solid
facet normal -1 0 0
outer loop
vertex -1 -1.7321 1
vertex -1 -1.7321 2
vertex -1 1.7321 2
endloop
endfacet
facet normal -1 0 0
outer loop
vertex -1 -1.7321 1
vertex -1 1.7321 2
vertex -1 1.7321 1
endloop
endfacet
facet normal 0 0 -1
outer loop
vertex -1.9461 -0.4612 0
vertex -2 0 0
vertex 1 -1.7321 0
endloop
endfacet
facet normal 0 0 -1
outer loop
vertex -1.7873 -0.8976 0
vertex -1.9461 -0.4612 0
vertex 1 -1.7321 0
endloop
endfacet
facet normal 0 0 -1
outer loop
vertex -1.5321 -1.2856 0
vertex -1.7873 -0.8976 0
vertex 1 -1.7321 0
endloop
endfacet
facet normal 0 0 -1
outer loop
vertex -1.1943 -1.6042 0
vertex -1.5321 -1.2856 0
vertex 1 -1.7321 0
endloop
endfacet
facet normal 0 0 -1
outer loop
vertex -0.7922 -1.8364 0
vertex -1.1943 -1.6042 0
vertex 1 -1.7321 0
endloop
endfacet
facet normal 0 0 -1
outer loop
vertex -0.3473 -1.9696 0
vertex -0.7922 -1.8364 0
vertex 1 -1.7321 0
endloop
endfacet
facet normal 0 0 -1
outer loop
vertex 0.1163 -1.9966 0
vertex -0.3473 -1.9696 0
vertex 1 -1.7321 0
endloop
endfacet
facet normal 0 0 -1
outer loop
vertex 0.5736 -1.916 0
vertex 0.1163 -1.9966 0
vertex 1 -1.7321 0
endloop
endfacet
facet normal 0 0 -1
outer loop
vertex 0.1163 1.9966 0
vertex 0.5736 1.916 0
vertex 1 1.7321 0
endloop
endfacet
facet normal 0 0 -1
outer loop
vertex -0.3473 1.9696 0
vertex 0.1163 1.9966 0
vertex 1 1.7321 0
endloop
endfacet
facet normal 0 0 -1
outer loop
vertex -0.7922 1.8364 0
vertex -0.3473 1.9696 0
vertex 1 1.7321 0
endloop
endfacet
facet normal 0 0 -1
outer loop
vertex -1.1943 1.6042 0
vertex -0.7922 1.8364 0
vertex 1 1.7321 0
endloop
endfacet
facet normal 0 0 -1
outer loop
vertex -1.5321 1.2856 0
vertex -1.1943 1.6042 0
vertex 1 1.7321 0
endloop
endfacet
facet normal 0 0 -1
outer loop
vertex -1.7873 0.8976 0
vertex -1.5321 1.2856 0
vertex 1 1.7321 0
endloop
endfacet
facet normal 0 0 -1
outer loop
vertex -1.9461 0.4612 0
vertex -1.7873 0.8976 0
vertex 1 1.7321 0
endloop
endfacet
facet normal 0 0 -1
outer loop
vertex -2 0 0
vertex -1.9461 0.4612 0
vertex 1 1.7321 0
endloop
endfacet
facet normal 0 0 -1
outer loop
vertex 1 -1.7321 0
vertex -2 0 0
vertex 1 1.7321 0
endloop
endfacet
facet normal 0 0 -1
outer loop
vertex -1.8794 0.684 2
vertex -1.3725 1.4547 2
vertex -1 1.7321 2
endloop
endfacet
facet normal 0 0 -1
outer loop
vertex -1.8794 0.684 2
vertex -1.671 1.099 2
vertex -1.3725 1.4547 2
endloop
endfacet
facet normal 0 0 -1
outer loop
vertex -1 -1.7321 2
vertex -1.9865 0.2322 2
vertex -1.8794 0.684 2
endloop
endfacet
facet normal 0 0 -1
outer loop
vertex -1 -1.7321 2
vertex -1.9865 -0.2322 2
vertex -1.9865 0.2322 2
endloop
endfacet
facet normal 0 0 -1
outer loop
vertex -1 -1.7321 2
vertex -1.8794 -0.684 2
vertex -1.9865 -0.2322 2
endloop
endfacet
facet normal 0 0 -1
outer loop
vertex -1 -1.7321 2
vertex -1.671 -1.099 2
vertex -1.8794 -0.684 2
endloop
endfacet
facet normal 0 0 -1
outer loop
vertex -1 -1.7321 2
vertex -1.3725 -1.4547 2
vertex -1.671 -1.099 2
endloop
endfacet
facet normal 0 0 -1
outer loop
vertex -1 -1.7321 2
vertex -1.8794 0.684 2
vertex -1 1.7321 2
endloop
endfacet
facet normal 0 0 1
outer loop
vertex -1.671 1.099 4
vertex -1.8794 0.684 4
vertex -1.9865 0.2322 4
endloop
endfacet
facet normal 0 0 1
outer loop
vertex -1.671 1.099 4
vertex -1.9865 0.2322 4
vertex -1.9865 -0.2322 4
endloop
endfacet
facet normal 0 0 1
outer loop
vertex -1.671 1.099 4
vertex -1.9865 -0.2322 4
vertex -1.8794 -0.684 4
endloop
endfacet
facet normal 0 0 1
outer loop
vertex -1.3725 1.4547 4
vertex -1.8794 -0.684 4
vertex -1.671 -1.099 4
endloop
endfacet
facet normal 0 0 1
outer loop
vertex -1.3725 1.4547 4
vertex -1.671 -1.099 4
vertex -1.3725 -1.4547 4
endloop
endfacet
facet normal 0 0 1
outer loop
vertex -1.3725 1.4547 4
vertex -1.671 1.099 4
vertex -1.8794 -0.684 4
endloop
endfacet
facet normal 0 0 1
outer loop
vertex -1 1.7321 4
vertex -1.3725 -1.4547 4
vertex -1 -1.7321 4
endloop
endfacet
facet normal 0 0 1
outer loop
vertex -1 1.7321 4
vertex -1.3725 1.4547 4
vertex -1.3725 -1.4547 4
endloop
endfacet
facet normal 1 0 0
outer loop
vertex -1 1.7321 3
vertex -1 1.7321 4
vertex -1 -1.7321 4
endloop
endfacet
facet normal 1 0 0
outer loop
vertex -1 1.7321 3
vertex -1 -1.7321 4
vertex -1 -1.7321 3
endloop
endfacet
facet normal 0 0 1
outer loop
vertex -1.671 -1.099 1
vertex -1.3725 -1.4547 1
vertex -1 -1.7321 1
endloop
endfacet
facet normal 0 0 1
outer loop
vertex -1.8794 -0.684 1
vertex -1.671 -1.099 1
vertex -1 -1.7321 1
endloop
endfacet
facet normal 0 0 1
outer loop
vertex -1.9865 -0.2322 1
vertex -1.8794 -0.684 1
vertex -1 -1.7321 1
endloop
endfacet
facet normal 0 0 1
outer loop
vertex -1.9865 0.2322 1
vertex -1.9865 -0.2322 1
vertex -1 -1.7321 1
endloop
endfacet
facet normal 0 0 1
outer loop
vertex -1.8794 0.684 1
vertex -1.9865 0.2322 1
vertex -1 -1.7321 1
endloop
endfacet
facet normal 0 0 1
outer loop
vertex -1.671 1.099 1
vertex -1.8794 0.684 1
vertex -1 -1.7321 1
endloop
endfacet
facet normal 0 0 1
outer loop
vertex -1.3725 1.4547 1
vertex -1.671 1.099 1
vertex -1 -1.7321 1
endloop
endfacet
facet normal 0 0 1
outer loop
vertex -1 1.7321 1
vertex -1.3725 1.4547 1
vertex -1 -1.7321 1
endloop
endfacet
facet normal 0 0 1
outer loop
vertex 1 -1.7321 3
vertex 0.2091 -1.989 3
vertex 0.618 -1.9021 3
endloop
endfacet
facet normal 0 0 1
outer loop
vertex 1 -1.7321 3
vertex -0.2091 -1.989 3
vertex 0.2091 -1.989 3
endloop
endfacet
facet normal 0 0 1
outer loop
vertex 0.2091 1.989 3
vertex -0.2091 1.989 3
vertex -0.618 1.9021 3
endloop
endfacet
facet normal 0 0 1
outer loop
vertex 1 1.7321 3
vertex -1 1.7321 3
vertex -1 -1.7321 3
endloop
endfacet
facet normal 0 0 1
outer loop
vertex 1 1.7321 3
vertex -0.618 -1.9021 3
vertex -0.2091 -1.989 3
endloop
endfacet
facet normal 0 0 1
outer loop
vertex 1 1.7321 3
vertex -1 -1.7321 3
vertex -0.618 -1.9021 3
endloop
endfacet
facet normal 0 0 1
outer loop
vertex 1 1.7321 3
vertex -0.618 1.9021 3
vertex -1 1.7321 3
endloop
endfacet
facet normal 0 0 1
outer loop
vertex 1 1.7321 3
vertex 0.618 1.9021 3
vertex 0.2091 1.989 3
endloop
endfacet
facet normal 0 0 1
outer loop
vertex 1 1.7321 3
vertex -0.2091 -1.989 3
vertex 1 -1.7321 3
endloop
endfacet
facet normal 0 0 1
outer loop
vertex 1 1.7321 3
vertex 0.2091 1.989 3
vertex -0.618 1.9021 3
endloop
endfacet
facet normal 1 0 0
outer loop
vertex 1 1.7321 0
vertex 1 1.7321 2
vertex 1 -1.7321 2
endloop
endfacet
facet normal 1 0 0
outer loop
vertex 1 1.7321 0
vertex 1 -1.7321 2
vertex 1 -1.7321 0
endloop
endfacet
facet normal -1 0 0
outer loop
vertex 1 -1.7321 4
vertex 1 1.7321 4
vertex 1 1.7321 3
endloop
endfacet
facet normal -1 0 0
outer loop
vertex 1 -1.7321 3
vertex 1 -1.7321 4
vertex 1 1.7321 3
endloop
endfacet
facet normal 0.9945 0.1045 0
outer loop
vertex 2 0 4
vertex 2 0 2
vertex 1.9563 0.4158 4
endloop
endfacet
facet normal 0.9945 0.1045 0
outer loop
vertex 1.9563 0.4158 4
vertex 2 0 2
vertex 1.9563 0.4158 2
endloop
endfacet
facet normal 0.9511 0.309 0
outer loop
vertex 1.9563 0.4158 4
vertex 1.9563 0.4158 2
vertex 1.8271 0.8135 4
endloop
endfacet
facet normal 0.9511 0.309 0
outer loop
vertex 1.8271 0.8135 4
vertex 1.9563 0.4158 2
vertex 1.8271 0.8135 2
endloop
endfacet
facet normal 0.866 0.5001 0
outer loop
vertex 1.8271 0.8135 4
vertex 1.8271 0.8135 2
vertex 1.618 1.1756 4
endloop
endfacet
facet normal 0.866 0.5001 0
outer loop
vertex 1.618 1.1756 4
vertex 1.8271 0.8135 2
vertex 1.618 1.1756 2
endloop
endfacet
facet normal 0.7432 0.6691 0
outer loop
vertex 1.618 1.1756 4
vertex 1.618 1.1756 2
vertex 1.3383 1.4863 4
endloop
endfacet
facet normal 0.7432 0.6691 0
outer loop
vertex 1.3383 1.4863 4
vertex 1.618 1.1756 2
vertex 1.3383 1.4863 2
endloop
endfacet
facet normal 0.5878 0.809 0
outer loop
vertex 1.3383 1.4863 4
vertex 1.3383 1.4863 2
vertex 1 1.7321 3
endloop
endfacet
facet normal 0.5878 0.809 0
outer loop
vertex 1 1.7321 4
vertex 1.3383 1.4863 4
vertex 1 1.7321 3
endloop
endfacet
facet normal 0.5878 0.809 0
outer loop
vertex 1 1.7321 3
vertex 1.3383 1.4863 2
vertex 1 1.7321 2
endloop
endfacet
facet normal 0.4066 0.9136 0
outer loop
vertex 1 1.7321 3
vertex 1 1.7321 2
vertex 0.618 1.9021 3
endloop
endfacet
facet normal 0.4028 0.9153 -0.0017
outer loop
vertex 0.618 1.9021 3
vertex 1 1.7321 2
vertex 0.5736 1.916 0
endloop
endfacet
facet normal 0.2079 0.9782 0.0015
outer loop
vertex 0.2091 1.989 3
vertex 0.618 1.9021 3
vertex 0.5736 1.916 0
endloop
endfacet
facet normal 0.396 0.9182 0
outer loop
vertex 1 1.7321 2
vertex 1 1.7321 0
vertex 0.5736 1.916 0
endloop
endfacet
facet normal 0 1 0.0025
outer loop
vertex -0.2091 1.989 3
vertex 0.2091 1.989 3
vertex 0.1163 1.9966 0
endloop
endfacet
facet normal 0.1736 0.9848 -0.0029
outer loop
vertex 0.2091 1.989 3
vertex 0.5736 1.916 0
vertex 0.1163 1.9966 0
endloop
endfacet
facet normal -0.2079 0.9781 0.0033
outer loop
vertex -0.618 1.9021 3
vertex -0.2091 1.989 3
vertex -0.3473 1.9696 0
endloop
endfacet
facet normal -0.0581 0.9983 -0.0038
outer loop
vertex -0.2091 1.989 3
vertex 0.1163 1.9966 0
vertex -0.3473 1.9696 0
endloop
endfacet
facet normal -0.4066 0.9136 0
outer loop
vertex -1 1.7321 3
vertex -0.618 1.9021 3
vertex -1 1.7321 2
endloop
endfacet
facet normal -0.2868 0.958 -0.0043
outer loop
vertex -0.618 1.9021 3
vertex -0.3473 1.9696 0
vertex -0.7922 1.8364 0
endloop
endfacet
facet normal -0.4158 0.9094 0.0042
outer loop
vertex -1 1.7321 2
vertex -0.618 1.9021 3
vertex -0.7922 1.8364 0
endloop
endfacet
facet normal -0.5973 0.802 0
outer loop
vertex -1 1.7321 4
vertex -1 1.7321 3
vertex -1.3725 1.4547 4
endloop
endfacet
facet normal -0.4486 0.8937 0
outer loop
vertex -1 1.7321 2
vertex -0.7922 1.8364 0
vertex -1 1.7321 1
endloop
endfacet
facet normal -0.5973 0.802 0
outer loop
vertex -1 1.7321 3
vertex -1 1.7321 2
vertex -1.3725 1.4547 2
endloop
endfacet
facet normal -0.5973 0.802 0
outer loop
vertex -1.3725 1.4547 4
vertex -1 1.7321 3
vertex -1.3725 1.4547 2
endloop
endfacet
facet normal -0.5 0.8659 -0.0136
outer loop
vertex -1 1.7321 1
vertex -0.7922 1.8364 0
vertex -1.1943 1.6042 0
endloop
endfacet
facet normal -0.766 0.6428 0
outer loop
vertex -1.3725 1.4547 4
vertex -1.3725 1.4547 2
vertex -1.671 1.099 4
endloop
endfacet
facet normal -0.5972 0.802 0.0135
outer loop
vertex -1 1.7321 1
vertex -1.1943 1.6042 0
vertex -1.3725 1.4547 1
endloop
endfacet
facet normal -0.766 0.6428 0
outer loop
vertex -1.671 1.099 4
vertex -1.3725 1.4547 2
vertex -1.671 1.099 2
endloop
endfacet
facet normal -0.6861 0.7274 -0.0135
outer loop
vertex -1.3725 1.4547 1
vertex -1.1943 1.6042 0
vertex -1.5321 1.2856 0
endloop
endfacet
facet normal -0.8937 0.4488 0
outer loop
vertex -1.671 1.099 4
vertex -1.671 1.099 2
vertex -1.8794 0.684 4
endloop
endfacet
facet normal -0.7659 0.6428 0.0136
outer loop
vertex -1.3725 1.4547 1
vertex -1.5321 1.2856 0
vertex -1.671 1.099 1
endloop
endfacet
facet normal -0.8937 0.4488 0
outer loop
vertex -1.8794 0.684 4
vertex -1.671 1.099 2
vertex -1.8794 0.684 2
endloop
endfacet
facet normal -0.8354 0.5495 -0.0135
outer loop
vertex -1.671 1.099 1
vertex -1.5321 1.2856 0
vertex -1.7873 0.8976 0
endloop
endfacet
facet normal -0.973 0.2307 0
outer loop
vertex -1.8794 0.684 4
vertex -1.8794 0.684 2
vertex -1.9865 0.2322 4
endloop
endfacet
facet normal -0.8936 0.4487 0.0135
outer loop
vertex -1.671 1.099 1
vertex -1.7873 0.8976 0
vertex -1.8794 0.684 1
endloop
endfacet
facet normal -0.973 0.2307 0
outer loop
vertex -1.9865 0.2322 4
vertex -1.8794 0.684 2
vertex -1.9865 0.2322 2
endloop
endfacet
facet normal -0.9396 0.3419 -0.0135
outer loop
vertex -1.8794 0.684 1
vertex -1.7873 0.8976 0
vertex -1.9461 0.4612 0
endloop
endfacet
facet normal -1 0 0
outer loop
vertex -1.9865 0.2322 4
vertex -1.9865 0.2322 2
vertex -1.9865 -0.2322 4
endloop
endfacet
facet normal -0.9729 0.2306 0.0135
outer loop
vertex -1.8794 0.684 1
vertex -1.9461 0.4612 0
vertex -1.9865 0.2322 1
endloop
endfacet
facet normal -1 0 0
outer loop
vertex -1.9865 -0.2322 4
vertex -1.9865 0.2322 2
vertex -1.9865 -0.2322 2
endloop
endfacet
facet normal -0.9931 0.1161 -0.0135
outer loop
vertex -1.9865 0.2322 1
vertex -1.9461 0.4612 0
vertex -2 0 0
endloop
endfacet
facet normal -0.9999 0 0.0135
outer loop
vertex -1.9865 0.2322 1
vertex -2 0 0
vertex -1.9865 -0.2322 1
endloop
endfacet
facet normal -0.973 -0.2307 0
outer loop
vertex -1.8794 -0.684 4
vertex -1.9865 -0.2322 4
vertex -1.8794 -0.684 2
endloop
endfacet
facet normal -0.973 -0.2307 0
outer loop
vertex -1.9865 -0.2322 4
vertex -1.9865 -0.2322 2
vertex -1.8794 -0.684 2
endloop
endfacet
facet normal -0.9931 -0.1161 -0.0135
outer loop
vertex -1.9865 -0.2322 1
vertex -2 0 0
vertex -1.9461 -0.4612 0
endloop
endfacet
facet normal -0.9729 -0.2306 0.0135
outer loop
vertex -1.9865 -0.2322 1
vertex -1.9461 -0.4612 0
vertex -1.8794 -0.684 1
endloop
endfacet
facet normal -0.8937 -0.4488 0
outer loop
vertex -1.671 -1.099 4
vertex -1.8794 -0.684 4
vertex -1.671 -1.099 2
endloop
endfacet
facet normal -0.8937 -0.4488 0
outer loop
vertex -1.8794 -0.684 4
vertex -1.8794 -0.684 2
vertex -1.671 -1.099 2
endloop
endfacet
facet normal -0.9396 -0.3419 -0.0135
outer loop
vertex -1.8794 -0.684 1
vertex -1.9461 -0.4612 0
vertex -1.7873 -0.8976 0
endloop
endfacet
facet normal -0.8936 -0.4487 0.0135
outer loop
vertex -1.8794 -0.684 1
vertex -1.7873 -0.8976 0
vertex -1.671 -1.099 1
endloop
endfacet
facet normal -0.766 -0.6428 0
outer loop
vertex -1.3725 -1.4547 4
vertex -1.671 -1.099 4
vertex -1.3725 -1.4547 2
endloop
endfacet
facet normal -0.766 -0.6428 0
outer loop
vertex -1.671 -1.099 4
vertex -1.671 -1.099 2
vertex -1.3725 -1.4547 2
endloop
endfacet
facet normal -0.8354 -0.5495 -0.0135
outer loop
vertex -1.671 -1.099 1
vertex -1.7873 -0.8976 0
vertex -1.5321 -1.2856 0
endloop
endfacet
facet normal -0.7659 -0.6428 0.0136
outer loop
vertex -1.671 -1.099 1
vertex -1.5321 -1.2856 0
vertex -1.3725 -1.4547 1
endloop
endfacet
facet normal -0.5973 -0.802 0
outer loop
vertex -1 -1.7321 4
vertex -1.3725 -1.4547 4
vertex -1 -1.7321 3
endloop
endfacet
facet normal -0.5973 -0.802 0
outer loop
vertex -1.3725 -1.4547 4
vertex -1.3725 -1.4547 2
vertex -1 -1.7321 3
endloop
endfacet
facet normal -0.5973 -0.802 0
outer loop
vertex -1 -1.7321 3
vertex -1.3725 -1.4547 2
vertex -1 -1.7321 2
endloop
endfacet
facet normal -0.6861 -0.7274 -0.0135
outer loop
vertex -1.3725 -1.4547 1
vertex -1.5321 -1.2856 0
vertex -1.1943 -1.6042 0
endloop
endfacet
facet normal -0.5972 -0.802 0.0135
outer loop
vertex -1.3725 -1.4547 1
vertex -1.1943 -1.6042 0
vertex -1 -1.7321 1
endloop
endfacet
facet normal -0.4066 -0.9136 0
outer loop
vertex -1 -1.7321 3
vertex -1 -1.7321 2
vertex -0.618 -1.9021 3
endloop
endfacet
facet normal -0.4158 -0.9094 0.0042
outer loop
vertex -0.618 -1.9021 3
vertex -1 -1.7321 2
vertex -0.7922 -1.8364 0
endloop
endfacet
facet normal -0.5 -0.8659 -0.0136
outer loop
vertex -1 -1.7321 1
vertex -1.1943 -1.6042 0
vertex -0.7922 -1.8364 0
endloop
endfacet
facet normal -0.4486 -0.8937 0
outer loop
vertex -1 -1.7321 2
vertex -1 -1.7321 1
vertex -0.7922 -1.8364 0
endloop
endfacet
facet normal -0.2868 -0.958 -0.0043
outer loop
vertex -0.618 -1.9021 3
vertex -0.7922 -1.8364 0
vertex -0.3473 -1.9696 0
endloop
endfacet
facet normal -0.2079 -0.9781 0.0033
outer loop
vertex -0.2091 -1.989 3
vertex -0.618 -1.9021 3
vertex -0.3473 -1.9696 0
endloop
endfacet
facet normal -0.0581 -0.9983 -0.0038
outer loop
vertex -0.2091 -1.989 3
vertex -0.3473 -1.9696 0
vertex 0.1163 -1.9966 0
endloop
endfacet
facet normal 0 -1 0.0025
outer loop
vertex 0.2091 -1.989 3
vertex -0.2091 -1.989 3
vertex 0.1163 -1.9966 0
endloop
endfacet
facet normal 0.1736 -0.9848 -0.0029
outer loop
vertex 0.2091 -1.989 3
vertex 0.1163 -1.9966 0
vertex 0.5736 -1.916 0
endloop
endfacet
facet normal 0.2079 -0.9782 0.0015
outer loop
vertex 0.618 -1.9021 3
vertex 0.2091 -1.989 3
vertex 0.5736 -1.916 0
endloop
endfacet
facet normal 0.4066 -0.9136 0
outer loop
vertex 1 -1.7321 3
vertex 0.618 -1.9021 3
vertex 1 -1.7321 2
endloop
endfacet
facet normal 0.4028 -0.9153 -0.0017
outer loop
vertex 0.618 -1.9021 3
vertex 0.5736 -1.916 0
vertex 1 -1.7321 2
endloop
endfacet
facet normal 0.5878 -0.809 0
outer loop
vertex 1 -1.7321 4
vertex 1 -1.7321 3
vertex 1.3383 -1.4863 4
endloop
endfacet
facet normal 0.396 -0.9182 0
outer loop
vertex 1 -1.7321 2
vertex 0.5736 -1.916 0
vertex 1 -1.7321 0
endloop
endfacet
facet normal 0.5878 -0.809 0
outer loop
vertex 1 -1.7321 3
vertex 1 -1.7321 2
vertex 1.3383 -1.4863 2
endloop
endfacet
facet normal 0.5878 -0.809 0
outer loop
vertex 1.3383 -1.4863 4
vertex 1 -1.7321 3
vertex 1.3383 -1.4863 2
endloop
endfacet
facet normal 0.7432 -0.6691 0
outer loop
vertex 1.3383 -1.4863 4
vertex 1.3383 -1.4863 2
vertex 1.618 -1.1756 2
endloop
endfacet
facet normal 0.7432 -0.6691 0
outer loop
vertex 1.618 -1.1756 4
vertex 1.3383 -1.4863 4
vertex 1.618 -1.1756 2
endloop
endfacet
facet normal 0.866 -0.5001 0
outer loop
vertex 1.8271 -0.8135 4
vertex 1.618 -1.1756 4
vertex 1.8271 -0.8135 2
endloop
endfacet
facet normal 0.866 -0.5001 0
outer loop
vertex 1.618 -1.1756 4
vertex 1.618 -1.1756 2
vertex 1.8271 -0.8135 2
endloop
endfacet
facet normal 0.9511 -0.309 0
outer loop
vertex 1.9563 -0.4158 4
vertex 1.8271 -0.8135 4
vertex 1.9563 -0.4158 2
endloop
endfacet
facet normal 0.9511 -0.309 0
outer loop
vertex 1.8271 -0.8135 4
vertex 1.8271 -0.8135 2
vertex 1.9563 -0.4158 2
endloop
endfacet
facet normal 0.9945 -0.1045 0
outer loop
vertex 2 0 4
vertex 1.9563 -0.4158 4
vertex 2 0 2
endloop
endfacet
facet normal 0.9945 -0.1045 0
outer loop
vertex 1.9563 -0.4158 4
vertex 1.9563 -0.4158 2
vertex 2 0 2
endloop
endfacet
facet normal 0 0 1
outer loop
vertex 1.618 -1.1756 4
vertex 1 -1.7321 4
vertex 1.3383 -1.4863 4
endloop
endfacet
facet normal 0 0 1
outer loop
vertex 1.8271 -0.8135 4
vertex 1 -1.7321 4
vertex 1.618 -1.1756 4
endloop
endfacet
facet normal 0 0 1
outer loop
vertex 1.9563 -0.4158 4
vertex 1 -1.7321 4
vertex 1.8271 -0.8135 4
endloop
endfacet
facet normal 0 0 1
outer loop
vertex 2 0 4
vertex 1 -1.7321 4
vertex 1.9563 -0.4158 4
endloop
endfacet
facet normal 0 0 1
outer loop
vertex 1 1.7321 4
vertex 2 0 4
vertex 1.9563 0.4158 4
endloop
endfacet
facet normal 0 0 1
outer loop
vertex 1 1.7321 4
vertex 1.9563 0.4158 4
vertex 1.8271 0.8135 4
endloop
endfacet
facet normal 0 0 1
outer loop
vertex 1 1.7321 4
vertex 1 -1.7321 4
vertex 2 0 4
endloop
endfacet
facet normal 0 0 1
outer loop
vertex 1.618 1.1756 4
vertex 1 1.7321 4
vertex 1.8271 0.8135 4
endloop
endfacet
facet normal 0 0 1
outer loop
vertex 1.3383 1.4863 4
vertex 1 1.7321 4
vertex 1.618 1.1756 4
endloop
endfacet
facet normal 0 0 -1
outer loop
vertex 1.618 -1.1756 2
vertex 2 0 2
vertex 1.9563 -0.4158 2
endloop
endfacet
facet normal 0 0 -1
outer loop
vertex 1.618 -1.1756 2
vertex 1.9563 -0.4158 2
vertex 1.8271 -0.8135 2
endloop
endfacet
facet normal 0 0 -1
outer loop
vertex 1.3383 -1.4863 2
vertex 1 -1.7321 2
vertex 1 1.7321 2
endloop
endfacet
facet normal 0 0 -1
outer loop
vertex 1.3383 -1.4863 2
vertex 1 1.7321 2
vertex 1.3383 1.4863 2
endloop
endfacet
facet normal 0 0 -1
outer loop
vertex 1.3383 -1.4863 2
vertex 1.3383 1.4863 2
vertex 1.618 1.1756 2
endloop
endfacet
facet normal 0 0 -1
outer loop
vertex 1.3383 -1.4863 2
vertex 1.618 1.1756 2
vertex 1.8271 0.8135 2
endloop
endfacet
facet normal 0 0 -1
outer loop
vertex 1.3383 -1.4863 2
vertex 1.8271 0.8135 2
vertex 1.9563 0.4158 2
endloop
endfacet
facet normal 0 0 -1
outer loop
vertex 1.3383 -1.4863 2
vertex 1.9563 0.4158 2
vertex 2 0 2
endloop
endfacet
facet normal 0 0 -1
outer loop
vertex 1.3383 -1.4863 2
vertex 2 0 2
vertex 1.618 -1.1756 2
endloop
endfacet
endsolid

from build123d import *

# Parameters (mm, degrees)
SKETCH1_R           = 2
BOSS_EXTRUDE1_DEPTH = 4
SKETCH2_W           = 1
SKETCH2_H           = 1
SKETCH2_H_2         = 2
SKETCH2_W_2         = 2
CUT_EXTRUDE1_DEPTH  = 5


with BuildPart() as part:
    # Sketch1 → Boss-Extrude1 (new body)
    with BuildSketch(Plane.XY):
        Circle(SKETCH1_R)
    extrude(amount=BOSS_EXTRUDE1_DEPTH)

    # Sketch2 → Cut-Extrude1 (cut, symmetric)
    with BuildSketch(Plane(origin=(0, 0, 0), x_dir=(1, 0, 0), z_dir=(0, 1, 0))):
        with Locations((-1.5, -1.5)):
            Rectangle(SKETCH2_W, SKETCH2_H)
        with Locations((1.5, -1)):
            Rectangle(SKETCH2_W, SKETCH2_H_2)
        with Locations((0, -3.5)):
            Rectangle(SKETCH2_W_2, SKETCH2_H)
    extrude(amount=CUT_EXTRUDE1_DEPTH, both=True, mode=Mode.SUBTRACT)


solid = part.part
